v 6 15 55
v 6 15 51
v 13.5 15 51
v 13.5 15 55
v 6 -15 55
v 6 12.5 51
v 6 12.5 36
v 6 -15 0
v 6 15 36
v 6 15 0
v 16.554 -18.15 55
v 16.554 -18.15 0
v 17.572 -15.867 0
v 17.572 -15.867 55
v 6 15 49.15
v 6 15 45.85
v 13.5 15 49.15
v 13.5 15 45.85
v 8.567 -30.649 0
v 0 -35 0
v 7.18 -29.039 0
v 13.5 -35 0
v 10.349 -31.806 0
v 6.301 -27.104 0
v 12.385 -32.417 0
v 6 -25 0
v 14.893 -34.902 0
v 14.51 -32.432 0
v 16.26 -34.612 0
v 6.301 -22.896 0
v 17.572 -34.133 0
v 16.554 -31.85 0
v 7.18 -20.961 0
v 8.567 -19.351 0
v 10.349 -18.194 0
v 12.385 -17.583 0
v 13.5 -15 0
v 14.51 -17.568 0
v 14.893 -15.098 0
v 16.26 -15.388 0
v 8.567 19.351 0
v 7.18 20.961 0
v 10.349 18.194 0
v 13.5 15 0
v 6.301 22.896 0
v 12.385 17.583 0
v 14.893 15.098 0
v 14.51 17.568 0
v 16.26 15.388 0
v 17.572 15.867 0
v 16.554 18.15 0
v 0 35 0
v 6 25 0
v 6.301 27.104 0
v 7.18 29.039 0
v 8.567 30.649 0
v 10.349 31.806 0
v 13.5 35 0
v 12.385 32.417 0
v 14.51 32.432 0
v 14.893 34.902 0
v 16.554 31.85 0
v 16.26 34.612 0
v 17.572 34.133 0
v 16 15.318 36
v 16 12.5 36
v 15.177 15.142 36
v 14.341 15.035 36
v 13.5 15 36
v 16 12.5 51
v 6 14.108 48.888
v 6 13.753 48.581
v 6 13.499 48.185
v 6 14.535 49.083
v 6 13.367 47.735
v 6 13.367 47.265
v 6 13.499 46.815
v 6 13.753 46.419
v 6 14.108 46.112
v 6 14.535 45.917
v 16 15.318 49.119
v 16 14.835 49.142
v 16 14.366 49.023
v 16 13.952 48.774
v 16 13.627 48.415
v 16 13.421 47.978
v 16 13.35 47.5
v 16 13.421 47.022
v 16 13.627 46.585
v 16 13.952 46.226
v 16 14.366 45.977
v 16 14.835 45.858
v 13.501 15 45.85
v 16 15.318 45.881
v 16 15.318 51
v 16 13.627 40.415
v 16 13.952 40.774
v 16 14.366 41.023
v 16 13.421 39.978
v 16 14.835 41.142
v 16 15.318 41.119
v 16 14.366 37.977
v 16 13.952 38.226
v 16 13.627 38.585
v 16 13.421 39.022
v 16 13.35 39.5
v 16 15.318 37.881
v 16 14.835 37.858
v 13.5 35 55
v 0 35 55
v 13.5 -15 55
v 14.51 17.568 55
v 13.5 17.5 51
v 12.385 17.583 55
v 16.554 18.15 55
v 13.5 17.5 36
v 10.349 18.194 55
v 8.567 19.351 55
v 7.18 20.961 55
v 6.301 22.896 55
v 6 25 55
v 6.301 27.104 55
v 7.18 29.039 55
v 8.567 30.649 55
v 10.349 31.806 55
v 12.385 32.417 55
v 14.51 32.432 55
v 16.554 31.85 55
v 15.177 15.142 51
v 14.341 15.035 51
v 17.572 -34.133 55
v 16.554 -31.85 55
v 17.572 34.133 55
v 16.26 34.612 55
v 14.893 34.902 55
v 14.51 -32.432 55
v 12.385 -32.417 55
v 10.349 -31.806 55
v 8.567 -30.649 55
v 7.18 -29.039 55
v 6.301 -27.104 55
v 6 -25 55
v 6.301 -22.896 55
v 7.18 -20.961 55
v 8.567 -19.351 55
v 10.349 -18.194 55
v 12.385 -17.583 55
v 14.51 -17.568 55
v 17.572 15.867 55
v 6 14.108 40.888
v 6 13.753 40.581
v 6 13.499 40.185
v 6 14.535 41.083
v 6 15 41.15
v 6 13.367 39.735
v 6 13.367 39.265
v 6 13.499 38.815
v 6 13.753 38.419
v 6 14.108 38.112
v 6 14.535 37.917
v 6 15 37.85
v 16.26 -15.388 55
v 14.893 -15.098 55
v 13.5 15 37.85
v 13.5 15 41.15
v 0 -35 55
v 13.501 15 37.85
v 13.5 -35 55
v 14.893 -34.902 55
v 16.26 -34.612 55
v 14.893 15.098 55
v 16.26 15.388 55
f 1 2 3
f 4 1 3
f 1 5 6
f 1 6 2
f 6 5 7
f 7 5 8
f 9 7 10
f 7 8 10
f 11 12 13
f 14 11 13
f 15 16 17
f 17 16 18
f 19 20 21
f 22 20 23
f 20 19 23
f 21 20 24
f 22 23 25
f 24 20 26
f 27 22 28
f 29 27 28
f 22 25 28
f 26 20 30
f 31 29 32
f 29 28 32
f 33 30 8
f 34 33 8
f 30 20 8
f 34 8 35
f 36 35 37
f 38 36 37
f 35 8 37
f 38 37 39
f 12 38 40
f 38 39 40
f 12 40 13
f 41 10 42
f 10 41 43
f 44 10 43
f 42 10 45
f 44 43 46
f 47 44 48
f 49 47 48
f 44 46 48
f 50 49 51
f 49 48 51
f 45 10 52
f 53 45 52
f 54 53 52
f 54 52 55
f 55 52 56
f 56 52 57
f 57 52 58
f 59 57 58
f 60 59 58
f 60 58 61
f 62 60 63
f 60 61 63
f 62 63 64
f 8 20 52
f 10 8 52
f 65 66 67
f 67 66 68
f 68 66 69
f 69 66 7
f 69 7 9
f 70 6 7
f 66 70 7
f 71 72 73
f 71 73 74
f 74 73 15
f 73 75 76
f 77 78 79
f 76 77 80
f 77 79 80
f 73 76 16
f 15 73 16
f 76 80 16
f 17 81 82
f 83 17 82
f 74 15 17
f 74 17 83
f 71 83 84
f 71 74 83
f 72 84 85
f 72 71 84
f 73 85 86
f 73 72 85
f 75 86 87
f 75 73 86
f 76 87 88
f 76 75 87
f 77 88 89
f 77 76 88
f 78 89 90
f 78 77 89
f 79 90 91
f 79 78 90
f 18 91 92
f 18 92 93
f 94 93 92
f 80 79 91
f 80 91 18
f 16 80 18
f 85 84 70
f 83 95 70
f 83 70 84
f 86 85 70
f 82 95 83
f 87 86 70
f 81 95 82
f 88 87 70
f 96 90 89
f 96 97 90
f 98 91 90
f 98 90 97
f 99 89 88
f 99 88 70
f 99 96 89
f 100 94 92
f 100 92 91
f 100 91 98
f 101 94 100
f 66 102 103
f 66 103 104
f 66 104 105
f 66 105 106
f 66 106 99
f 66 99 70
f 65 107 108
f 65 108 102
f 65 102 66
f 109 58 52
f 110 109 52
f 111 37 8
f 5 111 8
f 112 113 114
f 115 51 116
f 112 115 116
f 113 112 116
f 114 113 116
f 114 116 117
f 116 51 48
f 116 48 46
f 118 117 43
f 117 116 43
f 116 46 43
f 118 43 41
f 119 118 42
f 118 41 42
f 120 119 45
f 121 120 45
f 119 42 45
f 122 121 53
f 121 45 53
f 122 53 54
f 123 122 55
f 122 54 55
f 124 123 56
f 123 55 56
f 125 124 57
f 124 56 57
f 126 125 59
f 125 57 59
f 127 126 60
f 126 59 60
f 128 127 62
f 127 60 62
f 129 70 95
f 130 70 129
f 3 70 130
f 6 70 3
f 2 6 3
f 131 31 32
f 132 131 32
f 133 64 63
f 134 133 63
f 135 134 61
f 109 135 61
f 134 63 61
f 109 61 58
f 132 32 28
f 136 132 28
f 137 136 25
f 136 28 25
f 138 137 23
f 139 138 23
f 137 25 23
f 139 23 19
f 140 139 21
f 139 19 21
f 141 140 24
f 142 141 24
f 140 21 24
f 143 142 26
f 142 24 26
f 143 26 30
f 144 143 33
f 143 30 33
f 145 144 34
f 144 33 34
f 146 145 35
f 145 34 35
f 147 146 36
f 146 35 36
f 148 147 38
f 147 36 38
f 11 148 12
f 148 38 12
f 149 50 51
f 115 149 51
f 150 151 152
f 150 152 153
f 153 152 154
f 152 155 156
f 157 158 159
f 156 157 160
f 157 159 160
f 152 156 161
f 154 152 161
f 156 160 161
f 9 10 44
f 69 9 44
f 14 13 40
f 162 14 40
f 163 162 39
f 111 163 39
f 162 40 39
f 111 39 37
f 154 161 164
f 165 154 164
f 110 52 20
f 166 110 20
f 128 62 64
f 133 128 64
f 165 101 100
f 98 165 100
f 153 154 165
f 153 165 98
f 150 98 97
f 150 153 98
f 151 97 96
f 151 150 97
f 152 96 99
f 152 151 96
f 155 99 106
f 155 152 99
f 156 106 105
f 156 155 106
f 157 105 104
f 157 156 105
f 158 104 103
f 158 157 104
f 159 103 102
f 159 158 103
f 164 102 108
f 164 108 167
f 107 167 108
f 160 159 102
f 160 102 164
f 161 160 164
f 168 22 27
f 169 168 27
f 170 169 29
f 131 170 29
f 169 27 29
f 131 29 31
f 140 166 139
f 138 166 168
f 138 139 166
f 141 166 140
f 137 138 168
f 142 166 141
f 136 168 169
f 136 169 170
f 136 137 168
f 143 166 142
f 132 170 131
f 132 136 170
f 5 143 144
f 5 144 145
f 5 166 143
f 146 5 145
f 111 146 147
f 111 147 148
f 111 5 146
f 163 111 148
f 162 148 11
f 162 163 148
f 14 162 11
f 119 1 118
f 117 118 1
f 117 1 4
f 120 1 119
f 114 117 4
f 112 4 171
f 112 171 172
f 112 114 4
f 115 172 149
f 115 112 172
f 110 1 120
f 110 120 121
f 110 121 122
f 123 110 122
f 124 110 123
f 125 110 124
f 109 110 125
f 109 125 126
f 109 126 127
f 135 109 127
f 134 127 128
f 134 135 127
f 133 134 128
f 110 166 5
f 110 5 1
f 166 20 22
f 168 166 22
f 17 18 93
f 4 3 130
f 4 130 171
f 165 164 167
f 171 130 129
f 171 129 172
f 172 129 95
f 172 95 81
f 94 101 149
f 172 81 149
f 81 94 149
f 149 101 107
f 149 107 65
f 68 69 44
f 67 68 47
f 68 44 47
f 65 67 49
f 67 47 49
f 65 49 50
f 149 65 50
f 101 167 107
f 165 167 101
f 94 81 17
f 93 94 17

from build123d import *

# Parameters (mm, degrees)
RESSALTO_EXTRUS_O1_DEPTH = 55
ESBO_O3_W                = 15
ESBO_O3_H                = 5
ESBO_O3_R                = 1.65
RESSALTO_EXTRUS_O2_DEPTH = 10


with BuildPart() as part:
    # Esboço1 → Ressalto-extrusão1 (new body)
    with BuildSketch(Plane.XY):
        with BuildLine():
            Line((0, 35), (0, -35))
            Line((0, -35), (13.5, -35))
            ThreePointArc((13.5, -35), (15.581665999, -34.780933834), (17.572127481, -34.133333333))
            Line((17.572127481, -34.133333333), (16.554095611, -31.85))
            ThreePointArc((16.554095611, -31.85), (6, -25), (16.554095611, -18.15))
            Line((16.554095611, -18.15), (17.572127481, -15.866666667))
            ThreePointArc((17.572127481, -15.866666667), (15.581665999, -15.219066166), (13.5, -15))
            Line((13.5, -15), (6, -15))
            Line((6, -15), (6, 15))
            Line((6, 15), (13.5, 15))
            ThreePointArc((13.5, 15), (15.581665999, 15.219066166), (17.572127481, 15.866666667))
            Line((17.572127481, 15.866666667), (16.554095611, 18.15))
            ThreePointArc((16.554095611, 18.15), (6, 25), (16.554095611, 31.85))
            Line((16.554095611, 31.85), (17.572127481, 34.133333333))
            ThreePointArc((17.572127481, 34.133333333), (15.581665999, 34.780933834), (13.5, 35))
            Line((13.5, 35), (0, 35))
        make_face()
    extrude(amount=RESSALTO_EXTRUS_O1_DEPTH)

    # Esboço3 → Ressalto-extrusão2 (add)
    with BuildSketch(Plane(origin=(6, 0, 0), x_dir=(0, 0, -1), z_dir=(1, 0, 0))):
        with Locations((-43.5, 15)):
            Rectangle(ESBO_O3_W, ESBO_O3_H)
        with Locations((-47.5, 15)):
            Circle(ESBO_O3_R, mode=Mode.SUBTRACT)
        with Locations((-39.5, 15)):
            Circle(ESBO_O3_R, mode=Mode.SUBTRACT)
    extrude(amount=RESSALTO_EXTRUS_O2_DEPTH)


solid = part.part
